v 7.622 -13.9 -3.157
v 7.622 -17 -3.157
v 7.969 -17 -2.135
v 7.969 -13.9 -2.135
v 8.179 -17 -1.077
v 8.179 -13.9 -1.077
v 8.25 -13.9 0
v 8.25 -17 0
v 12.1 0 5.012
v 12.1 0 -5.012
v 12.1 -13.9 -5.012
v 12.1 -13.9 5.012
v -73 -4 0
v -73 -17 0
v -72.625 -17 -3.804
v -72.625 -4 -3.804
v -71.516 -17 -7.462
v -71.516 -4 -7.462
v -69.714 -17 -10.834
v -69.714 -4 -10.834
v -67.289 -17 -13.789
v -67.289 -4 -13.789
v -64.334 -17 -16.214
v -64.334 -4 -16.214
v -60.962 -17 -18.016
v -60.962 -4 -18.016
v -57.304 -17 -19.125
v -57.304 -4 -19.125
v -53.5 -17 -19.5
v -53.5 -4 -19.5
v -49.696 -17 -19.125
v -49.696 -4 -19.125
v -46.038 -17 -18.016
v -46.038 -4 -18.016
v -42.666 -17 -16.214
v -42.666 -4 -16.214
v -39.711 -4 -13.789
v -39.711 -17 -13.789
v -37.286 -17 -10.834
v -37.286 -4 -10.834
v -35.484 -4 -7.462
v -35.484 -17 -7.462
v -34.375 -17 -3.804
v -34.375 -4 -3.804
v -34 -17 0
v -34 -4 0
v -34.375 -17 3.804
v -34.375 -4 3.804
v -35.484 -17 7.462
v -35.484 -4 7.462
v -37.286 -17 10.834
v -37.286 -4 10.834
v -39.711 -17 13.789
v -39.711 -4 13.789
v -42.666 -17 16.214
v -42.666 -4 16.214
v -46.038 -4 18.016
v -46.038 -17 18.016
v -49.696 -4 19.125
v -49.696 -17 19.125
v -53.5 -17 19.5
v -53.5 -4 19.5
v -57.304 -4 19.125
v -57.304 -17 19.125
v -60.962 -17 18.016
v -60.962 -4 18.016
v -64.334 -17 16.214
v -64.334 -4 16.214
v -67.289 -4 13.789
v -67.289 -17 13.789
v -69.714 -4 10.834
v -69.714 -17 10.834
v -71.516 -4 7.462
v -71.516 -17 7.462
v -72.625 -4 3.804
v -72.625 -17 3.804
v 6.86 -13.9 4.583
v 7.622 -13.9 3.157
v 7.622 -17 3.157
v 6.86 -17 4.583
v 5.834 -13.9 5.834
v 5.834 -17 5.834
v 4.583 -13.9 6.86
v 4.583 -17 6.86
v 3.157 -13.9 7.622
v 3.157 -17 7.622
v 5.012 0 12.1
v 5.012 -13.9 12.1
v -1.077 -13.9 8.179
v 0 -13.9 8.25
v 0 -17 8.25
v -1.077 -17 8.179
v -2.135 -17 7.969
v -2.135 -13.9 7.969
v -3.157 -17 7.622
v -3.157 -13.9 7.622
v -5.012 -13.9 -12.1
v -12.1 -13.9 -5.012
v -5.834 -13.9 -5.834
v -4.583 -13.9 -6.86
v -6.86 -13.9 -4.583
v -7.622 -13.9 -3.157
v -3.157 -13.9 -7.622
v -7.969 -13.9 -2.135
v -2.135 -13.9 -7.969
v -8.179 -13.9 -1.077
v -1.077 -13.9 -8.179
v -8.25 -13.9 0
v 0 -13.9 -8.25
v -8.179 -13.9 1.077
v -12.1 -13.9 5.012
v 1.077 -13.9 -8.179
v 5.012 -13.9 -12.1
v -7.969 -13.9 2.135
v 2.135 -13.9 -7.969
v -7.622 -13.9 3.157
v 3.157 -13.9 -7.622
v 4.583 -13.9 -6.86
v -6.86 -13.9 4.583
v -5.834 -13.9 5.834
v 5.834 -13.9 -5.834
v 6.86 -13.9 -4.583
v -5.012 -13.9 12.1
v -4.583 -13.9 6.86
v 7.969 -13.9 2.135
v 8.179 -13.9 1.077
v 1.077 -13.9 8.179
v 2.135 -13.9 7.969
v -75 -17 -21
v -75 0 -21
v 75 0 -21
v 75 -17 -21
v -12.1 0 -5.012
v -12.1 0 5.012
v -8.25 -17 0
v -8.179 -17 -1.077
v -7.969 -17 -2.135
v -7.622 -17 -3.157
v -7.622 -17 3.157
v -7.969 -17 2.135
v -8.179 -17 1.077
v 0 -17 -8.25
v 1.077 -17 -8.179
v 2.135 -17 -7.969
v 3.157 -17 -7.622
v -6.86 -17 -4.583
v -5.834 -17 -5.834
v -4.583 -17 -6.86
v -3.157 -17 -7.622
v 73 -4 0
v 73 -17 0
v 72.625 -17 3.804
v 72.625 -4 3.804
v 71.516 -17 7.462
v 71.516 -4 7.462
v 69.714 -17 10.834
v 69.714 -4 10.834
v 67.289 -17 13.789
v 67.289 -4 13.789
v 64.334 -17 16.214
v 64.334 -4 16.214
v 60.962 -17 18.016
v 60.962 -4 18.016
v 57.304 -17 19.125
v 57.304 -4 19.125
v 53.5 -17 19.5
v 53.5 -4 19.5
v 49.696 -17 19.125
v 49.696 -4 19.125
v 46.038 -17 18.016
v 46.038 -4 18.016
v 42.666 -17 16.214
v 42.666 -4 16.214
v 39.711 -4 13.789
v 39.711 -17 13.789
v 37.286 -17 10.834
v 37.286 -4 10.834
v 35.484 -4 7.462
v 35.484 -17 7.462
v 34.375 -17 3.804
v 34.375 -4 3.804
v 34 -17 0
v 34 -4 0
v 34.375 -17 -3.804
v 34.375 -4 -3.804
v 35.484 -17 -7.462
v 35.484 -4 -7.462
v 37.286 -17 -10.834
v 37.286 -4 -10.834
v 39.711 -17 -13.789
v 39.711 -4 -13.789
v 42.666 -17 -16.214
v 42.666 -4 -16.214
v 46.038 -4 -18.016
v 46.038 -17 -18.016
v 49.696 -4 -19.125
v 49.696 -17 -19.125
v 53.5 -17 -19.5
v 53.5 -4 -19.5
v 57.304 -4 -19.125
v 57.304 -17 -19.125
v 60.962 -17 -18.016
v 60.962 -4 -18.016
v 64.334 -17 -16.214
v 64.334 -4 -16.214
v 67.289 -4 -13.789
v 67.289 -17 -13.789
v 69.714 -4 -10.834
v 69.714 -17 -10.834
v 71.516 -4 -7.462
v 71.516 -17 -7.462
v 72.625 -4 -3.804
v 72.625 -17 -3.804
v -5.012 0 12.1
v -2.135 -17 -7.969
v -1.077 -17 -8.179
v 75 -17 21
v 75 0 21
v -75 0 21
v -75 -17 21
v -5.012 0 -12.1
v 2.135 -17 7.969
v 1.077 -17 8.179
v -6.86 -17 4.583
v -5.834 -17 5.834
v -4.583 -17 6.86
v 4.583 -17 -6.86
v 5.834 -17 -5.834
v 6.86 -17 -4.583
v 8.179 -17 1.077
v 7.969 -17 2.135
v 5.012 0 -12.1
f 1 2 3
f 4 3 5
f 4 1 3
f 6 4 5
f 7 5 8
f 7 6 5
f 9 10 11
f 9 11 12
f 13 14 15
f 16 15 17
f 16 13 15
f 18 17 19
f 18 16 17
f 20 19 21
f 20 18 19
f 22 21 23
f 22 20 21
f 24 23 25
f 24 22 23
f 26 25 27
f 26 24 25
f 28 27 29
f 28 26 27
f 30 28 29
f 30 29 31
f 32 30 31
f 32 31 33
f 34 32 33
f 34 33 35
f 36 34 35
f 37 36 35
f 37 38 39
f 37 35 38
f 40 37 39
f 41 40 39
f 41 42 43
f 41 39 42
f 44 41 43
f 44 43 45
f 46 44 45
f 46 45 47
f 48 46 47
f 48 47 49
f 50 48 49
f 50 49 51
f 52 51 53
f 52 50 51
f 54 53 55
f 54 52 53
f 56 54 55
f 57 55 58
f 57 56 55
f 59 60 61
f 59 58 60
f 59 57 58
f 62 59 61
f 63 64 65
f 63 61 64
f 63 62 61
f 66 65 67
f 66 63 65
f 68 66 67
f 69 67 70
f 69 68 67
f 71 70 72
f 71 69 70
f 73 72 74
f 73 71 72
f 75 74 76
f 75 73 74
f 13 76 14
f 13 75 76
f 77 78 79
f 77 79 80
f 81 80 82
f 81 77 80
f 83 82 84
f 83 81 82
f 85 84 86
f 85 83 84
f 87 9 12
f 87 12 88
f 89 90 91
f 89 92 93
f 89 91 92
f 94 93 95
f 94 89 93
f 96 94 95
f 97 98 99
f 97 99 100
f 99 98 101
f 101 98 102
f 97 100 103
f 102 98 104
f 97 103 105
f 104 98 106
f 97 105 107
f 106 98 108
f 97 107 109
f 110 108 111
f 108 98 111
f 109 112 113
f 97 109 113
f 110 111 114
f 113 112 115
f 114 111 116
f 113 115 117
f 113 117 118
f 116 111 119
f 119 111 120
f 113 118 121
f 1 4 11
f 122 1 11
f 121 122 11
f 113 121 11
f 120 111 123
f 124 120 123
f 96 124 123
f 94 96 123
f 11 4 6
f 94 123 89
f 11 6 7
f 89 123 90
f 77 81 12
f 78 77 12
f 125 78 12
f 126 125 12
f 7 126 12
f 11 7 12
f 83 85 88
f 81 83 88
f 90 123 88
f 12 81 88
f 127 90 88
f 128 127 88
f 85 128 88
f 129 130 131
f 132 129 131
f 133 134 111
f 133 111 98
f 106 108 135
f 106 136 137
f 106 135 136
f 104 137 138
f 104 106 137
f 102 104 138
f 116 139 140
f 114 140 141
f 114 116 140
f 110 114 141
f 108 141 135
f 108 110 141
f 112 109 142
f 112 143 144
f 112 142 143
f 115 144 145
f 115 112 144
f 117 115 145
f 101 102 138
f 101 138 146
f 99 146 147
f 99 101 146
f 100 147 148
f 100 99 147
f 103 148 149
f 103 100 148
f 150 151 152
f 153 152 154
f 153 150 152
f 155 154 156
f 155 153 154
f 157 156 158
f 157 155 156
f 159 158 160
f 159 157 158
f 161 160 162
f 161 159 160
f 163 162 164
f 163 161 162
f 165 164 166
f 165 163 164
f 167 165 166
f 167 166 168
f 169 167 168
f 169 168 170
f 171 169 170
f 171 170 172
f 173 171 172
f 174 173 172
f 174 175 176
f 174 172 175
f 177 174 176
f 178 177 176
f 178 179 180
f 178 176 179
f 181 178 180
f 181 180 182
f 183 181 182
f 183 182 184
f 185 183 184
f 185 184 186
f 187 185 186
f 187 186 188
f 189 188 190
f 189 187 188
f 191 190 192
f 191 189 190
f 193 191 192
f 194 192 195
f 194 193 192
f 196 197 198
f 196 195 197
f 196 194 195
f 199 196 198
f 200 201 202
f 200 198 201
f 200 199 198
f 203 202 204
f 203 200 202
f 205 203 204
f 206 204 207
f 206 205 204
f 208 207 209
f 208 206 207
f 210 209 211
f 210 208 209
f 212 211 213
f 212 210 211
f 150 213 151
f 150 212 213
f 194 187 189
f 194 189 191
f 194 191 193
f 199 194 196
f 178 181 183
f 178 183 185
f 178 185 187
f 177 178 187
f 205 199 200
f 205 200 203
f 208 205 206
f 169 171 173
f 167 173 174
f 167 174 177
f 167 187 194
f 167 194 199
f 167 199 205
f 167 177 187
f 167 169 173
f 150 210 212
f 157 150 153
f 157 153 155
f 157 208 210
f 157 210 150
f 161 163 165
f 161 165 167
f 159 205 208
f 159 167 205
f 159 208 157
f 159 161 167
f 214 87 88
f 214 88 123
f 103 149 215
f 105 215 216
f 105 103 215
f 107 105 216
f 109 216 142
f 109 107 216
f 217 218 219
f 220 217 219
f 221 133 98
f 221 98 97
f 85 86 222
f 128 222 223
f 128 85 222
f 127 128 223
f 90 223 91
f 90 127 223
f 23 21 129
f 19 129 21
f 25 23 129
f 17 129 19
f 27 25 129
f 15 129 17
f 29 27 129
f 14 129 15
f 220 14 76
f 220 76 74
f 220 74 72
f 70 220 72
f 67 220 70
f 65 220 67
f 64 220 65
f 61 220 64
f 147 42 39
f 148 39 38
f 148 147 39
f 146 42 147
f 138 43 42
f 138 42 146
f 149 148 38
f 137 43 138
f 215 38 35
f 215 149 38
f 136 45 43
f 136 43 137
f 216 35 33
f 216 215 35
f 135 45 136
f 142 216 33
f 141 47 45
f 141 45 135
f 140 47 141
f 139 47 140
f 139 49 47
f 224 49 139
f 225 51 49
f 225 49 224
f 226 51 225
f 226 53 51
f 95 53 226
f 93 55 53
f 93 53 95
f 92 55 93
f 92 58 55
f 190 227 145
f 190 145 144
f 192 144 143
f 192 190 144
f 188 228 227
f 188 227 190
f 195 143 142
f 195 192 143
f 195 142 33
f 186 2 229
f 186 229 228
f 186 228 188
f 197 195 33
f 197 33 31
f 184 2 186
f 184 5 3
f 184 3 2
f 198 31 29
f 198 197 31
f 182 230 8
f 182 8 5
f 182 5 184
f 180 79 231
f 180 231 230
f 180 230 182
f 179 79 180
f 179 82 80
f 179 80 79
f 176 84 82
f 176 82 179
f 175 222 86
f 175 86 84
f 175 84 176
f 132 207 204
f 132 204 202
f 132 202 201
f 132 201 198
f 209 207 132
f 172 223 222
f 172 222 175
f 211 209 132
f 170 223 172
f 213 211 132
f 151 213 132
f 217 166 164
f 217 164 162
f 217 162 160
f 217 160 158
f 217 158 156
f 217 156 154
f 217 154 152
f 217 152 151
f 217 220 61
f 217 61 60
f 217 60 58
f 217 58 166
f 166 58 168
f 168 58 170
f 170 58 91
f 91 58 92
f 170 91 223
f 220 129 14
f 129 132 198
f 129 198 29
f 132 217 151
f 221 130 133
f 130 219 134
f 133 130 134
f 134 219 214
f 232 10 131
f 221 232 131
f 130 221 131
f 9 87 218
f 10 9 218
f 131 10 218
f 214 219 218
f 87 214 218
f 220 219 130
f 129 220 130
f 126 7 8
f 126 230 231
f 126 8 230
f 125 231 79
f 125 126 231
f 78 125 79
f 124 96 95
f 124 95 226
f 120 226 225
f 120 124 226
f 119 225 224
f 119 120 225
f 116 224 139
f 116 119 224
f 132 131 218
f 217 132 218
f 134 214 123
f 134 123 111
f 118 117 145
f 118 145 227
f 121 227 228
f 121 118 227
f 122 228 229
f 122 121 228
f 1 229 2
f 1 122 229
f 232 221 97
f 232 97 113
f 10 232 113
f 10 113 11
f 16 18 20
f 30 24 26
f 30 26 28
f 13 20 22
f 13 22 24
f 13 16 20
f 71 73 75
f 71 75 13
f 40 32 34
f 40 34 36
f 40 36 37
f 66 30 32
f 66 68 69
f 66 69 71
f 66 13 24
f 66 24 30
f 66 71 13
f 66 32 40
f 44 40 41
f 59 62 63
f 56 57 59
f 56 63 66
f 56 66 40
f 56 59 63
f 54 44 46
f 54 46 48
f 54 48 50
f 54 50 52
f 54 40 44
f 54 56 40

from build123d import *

# Parameters (mm, degrees)
F1_DEPTH = 13.9
F2_DEPTH = 25
F3_R     = 19.5
F4_DEPTH = 17
F6_DEPTH = 20.74372


with BuildPart() as f1:
    # F0 (on Front) → F1 (new body)
    with BuildSketch(Plane.XZ):
        with BuildLine():
            Line((5.0119841047, 12.1), (3.157138317, 7.6220061432))
            ThreePointArc((3.157138317, 7.6220061432), (5.8336309448, 5.8336309448), (7.6220061432, 3.157138317))
            Line((7.6220061432, 3.157138317), (12.1, 5.0119841047))
            Line((12.1, 5.0119841047), (5.0119841047, 12.1))
        make_face()
        with BuildLine():
            Line((0, 12.1), (0, 8.25))
            ThreePointArc((0, 8.25), (1.6094951566, 8.0914785633), (3.157138317, 7.6220061432))
            Line((3.157138317, 7.6220061432), (5.0119841047, 12.1))
            Line((5.0119841047, 12.1), (0, 12.1))
        make_face()
        with BuildLine():
            ThreePointArc((-3.157138317, 7.6220061432), (-1.6094951566, 8.0914785633), (0, 8.25))
            Line((0, 8.25), (0, 12.1))
            Line((0, 12.1), (-5.0119841047, 12.1))
            Line((-5.0119841047, 12.1), (-3.157138317, 7.6220061432))
        make_face()
        with BuildLine():
            ThreePointArc((-7.6220061432, 3.157138317), (-5.8336309448, 5.8336309448), (-3.157138317, 7.6220061432))
            Line((-3.157138317, 7.6220061432), (-5.0119841047, 12.1))
            Line((-5.0119841047, 12.1), (-12.1, 5.0119841047))
            Line((-12.1, 5.0119841047), (-7.6220061432, 3.157138317))
        make_face()
        with BuildLine():
            ThreePointArc((-3.157138317, -7.6220061432), (-5.8336309448, -5.8336309448), (-7.6220061432, -3.157138317))
            Line((-7.6220061432, -3.157138317), (-12.1, -5.0119841047))
            Line((-12.1, -5.0119841047), (-5.0119841047, -12.1))
            Line((-5.0119841047, -12.1), (-3.157138317, -7.6220061432))
        make_face()
        with BuildLine():
            ThreePointArc((-7.6220061432, -3.157138317), (-8.0914785633, -1.6094951566), (-8.25, 0))
            Line((-8.25, 0), (-12.1, 0))
            Line((-12.1, 0), (-12.1, -5.0119841047))
            Line((-12.1, -5.0119841047), (-7.6220061432, -3.157138317))
        make_face()
        with BuildLine():
            Line((-12.1, 0), (-8.25, 0))
            ThreePointArc((-8.25, 0), (-8.0914785633, 1.6094951566), (-7.6220061432, 3.157138317))
            Line((-7.6220061432, 3.157138317), (-12.1, 5.0119841047))
            Line((-12.1, 5.0119841047), (-12.1, 0))
        make_face()
        with BuildLine():
            Line((0, -12.1), (0, -8.25))
            ThreePointArc((0, -8.25), (-1.6094951566, -8.0914785633), (-3.157138317, -7.6220061432))
            Line((-3.157138317, -7.6220061432), (-5.0119841047, -12.1))
            Line((-5.0119841047, -12.1), (0, -12.1))
        make_face()
        with BuildLine():
            ThreePointArc((3.157138317, -7.6220061432), (1.6094951566, -8.0914785633), (0, -8.25))
            Line((0, -8.25), (0, -12.1))
            Line((0, -12.1), (5.0119841047, -12.1))
            Line((5.0119841047, -12.1), (3.157138317, -7.6220061432))
        make_face()
        with BuildLine():
            ThreePointArc((7.6220061432, -3.157138317), (5.8336309448, -5.8336309448), (3.157138317, -7.6220061432))
            Line((3.157138317, -7.6220061432), (5.0119841047, -12.1))
            Line((5.0119841047, -12.1), (12.1, -5.0119841047))
            Line((12.1, -5.0119841047), (7.6220061432, -3.157138317))
        make_face()
        with BuildLine():
            Line((12.1, 0), (8.25, 0))
            ThreePointArc((8.25, 0), (8.0914785633, -1.6094951566), (7.6220061432, -3.157138317))
            Line((7.6220061432, -3.157138317), (12.1, -5.0119841047))
            Line((12.1, -5.0119841047), (12.1, 0))
        make_face()
        with BuildLine():
            ThreePointArc((7.6220061432, 3.157138317), (8.0914785633, 1.6094951566), (8.25, 0))
            Line((8.25, 0), (12.1, 0))
            Line((12.1, 0), (12.1, 5.0119841047))
            Line((12.1, 5.0119841047), (7.6220061432, 3.157138317))
        make_face()
    extrude(amount=F1_DEPTH)


with BuildPart() as f2:
    # F0 (on Front) → F2 (new body)
    with BuildSketch(Plane.XZ):
        with BuildLine():
            Line((3.157138317, 7.6220061432), (0, 0))
            Line((0, 0), (7.6220061432, 3.157138317))
            ThreePointArc((7.6220061432, 3.157138317), (5.8336309448, 5.8336309448), (3.157138317, 7.6220061432))
        make_face()
        with BuildLine():
            Line((0, 8.25), (0, 0))
            Line((0, 0), (3.157138317, 7.6220061432))
            ThreePointArc((3.157138317, 7.6220061432), (1.6094951566, 8.0914785633), (0, 8.25))
        make_face()
        with BuildLine():
            Line((-3.157138317, 7.6220061432), (0, 0))
            Line((0, 0), (0, 8.25))
            ThreePointArc((0, 8.25), (-1.6094951566, 8.0914785633), (-3.157138317, 7.6220061432))
        make_face()
        with BuildLine():
            Line((-7.6220061432, 3.157138317), (0, 0))
            Line((0, 0), (-3.157138317, 7.6220061432))
            ThreePointArc((-3.157138317, 7.6220061432), (-5.8336309448, 5.8336309448), (-7.6220061432, 3.157138317))
        make_face()
        with BuildLine():
            Line((-8.25, 0), (0, 0))
            Line((0, 0), (-7.6220061432, 3.157138317))
            ThreePointArc((-7.6220061432, 3.157138317), (-8.0914785633, 1.6094951566), (-8.25, 0))
        make_face()
        with BuildLine():
            Line((-7.6220061432, -3.157138317), (0, 0))
            Line((0, 0), (-8.25, 0))
            ThreePointArc((-8.25, 0), (-8.0914785633, -1.6094951566), (-7.6220061432, -3.157138317))
        make_face()
        with BuildLine():
            Line((-3.157138317, -7.6220061432), (0, 0))
            Line((0, 0), (-7.6220061432, -3.157138317))
            ThreePointArc((-7.6220061432, -3.157138317), (-5.8336309448, -5.8336309448), (-3.157138317, -7.6220061432))
        make_face()
        with BuildLine():
            Line((0, -8.25), (0, 0))
            Line((0, 0), (-3.157138317, -7.6220061432))
            ThreePointArc((-3.157138317, -7.6220061432), (-1.6094951566, -8.0914785633), (0, -8.25))
        make_face()
        with BuildLine():
            Line((3.157138317, -7.6220061432), (0, 0))
            Line((0, 0), (0, -8.25))
            ThreePointArc((0, -8.25), (1.6094951566, -8.0914785633), (3.157138317, -7.6220061432))
        make_face()
        with BuildLine():
            Line((7.6220061432, -3.157138317), (0, 0))
            Line((0, 0), (3.157138317, -7.6220061432))
            ThreePointArc((3.157138317, -7.6220061432), (5.8336309448, -5.8336309448), (7.6220061432, -3.157138317))
        make_face()
        with BuildLine():
            Line((8.25, 0), (0, 0))
            Line((0, 0), (7.6220061432, -3.157138317))
            ThreePointArc((7.6220061432, -3.157138317), (8.0914785633, -1.6094951566), (8.25, 0))
        make_face()
        with BuildLine():
            Line((7.6220061432, 3.157138317), (0, 0))
            Line((0, 0), (8.25, 0))
            ThreePointArc((8.25, 0), (8.0914785633, 1.6094951566), (7.6220061432, 3.157138317))
        make_face()
    extrude(amount=F2_DEPTH)


with BuildPart() as f4:
    # F3 (on Front) → F4 (new body)
    with BuildSketch(Plane.XZ):
        Polygon((75, 21), (-75, 21), (-75, 0), (-75, -21), (75, -21), (75, 0), align=None)
        with BuildLine():
            ThreePointArc((-34, 0), (-53.5, -19.5), (-73, 0))
            ThreePointArc((-73, 0), (-53.5, 19.5), (-34, 0))
        make_face(mode=Mode.SUBTRACT)
        with Locations((53.5, 0)):
            Circle(F3_R, mode=Mode.SUBTRACT)
        with BuildLine():
            ThreePointArc((-34, 0), (-53.5, 19.5), (-73, 0))
            ThreePointArc((-73, 0), (-53.5, -19.5), (-34, 0))
        make_face()
        with Locations((53.5, 0)):
            Circle(F3_R)
    extrude(amount=F4_DEPTH)

    # F5: cut F2, F1
    add(f2.part, mode=Mode.SUBTRACT)
    add(f1.part, mode=Mode.SUBTRACT)


with BuildPart() as f6:
    # F3 (on Front) → F6 (new body)
    with BuildSketch(Plane.XZ):
        with BuildLine():
            ThreePointArc((-34, 0), (-53.5, 19.5), (-73, 0))
            ThreePointArc((-73, 0), (-53.5, -19.5), (-34, 0))
        make_face()
    extrude(amount=F6_DEPTH)


with BuildPart() as f6b:
    # F3 (on Front) → F6, piece 2 (new body)
    with BuildSketch(Plane.XZ):
        with Locations((53.5, 0)):
            Circle(F3_R)
    extrude(amount=F6_DEPTH)


with BuildPart() as f6_1:
    # F7: moved
    add(f6.part.moved(Location((0, -4, 0))))


with BuildPart() as f6b_1:
    # F7: moved
    add(f6b.part.moved(Location((0, -4, 0))))


with BuildPart() as f4_1:
    add(f4.part)

    # F8: cut F6, F6b
    add(f6_1.part, mode=Mode.SUBTRACT)
    add(f6b_1.part, mode=Mode.SUBTRACT)


solid = f4_1.part
